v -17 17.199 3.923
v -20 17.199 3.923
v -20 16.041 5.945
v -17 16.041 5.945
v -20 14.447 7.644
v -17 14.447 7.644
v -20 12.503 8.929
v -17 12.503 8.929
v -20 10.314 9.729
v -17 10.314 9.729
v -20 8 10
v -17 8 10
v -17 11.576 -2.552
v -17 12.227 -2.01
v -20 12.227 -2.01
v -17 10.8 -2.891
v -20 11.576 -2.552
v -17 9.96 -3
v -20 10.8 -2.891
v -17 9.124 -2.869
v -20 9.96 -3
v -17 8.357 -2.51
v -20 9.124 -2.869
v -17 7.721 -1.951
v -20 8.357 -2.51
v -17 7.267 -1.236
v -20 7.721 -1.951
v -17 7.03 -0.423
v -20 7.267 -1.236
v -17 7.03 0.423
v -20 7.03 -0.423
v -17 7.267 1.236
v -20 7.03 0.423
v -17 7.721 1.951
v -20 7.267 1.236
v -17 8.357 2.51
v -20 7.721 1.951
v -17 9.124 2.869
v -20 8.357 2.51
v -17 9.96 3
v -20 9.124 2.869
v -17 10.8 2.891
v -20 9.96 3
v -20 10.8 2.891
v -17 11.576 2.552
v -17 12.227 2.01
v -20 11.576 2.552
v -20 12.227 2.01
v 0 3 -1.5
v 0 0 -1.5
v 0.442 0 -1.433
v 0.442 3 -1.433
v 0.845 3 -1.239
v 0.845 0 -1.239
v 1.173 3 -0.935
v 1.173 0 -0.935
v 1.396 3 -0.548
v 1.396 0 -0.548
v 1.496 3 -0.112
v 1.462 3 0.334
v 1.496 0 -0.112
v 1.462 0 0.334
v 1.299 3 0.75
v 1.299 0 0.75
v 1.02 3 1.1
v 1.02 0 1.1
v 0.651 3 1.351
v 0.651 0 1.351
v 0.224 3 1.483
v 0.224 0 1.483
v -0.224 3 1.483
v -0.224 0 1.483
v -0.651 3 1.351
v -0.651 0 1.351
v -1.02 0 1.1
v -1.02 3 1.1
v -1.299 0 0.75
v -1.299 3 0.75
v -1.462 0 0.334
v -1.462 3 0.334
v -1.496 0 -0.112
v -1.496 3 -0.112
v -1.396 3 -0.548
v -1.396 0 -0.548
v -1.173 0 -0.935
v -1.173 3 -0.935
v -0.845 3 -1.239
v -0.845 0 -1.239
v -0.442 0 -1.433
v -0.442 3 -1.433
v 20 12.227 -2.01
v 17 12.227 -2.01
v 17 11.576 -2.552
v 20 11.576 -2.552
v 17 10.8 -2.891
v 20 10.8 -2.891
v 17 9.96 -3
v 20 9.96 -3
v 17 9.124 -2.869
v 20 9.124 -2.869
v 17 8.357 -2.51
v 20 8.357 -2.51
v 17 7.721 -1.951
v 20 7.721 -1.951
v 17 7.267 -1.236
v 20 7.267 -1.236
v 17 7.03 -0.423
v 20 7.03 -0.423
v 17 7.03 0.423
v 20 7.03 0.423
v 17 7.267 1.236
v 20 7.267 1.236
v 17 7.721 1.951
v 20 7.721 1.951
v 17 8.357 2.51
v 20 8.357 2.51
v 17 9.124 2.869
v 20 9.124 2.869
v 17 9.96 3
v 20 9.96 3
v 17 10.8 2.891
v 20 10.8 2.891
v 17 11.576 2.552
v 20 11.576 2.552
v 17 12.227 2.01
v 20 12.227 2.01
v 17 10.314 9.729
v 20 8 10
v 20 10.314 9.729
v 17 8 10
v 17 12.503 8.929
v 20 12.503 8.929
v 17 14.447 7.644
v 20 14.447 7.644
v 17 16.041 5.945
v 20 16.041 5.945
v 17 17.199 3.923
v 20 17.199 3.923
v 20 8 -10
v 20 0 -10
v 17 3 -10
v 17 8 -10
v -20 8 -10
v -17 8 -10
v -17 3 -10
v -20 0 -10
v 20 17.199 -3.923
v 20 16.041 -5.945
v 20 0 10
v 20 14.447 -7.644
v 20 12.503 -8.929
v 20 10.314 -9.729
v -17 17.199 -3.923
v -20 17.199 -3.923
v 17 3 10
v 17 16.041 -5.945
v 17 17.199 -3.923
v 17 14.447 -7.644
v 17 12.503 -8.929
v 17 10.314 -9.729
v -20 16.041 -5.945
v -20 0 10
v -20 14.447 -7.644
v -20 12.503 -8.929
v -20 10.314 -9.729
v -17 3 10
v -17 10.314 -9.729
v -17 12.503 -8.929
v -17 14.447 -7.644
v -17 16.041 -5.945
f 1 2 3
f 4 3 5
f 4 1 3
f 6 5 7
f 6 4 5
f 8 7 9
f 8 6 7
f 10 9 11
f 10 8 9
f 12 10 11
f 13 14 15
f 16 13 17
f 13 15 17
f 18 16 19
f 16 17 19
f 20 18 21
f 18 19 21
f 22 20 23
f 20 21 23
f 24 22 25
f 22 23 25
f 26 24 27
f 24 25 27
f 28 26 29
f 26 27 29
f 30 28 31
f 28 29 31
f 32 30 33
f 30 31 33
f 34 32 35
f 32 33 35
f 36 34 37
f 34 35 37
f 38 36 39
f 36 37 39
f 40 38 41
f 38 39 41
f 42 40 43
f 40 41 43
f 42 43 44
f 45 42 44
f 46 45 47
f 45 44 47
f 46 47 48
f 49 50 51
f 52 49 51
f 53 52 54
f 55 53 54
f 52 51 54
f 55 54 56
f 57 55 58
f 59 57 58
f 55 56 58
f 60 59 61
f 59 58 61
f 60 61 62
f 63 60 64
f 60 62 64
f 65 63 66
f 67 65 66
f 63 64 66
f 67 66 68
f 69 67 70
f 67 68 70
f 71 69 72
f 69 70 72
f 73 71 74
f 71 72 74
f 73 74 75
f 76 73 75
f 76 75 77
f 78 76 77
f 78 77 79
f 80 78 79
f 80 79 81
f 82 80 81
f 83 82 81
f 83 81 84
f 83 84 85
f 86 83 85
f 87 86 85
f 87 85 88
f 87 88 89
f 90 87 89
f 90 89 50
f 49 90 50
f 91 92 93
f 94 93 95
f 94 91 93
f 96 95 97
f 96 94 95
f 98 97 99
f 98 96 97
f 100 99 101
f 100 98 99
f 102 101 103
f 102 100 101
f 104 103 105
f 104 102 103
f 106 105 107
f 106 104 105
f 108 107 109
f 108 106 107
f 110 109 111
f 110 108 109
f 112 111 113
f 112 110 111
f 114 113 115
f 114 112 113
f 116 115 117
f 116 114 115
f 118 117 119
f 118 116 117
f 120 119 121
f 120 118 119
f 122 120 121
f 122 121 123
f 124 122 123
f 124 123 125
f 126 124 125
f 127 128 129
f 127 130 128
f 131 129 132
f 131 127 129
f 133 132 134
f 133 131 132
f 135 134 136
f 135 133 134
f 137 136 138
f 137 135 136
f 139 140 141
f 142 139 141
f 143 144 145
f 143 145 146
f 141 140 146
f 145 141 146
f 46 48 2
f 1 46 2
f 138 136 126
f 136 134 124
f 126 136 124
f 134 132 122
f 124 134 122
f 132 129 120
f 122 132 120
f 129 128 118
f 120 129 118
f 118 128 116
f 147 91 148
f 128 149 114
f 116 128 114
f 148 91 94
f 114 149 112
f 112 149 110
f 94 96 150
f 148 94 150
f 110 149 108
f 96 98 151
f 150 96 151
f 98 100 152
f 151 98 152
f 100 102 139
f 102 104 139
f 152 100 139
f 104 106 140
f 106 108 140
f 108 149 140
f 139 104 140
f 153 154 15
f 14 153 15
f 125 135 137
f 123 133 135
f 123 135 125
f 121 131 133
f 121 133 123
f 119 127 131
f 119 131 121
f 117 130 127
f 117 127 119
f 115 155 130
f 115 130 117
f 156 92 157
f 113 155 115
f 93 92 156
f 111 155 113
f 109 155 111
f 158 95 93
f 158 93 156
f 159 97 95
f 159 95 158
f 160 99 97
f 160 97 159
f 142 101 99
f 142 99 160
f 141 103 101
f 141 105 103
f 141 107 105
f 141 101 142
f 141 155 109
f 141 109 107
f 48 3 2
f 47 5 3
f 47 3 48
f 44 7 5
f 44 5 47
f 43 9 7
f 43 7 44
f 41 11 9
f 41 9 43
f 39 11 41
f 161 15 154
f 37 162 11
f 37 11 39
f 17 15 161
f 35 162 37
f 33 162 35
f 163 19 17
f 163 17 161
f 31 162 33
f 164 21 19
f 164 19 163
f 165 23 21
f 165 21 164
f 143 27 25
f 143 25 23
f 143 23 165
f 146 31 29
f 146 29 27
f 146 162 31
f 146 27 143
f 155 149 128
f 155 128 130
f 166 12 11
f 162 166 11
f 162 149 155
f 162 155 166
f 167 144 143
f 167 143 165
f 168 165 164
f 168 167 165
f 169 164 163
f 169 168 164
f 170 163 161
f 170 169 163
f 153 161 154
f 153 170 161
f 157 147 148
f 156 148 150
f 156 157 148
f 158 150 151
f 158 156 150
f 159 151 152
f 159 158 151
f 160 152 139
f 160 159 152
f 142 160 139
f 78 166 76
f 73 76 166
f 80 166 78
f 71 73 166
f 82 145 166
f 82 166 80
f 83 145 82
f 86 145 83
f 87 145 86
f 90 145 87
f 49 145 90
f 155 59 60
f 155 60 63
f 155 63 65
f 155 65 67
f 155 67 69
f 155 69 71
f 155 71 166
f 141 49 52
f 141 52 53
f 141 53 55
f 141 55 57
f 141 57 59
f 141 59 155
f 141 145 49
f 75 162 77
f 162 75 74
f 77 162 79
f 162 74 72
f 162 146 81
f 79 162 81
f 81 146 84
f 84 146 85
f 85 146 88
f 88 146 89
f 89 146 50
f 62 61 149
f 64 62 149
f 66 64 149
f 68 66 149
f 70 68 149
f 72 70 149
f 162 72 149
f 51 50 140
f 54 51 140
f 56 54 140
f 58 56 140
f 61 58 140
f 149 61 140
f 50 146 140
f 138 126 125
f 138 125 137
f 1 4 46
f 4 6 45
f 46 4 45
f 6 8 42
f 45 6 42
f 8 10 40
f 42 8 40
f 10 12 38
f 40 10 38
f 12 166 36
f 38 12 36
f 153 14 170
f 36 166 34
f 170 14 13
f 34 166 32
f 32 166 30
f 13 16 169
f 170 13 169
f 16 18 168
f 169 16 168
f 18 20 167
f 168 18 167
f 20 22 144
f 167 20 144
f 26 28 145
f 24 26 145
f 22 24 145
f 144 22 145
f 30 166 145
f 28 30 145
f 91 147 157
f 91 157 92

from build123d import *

# Parameters (mm, degrees)
SKETCH1_W                   = 40
SKETCH1_H                   = 20
BOSS_EXTRUDE1_DEPTH         = 3
SKETCH2_W                   = 3
SKETCH2_H                   = 20
BOSS_EXTRUDE2_DEPTH         = 15
CUT_EXTRUDE1_REACH          = 46.989
SKETCH4_R                   = 3
FILLET1_RADIUS              = 10
FILLET1_LENGTH              = 3
CUT_EXTRUDE3_REACH          = 46.989
FILLET1_OF_MIRROR1_2_RADIUS = 10
FILLET1_OF_MIRROR1_2_LENGTH = 3
CUT_EXTRUDE2_REACH          = 30.21
SKETCH6_R                   = 1.5


with BuildPart() as part:
    # Sketch1 → Boss-Extrude1 (new body)
    with BuildSketch(Plane(origin=(0, 0, 0), x_dir=(1, 0, 0), z_dir=(0, 1, 0))):
        Rectangle(SKETCH1_W, SKETCH1_H)
    extrude(amount=BOSS_EXTRUDE1_DEPTH)

    # Sketch2 → Boss-Extrude2 (add)
    with BuildSketch(Plane(origin=(0, 3, 0), x_dir=(1, 0, 0), z_dir=(0, 1, 0))):
        with Locations((-18.5, 0)):
            Rectangle(SKETCH2_W, SKETCH2_H)
    boss_extrude2 = extrude(amount=BOSS_EXTRUDE2_DEPTH)

    # Sketch4 → Cut-Extrude1 (cut, up to next)
    with BuildSketch(Plane.ZY.offset(20), mode=Mode.PRIVATE) as cut_extrude1_sk1:
        with Locations((0, 10)):
            Circle(SKETCH4_R)
    cut_extrude1_tool1 = extrude(cut_extrude1_sk1.sketch, amount=-CUT_EXTRUDE1_REACH, mode=Mode.PRIVATE) & part.part
    cut_extrude1 = cut_extrude1_tool1.solids().sort_by_distance((-20, 10, 0))[0]
    add(cut_extrude1, mode=Mode.SUBTRACT)

    # Fillet1: full round fillet: the end face becomes a half cylinder, R = half its width
    fillet1_face = Plane((-18.5, 18, 0), x_dir=(1, 0, 0), z_dir=(0, 1, 0))  # on the end face: x along it, z out of the body
    fillet1_slab = fillet1_face.offset(-FILLET1_RADIUS / 2) * Box(FILLET1_LENGTH, 2 * FILLET1_RADIUS, FILLET1_RADIUS, mode=Mode.PRIVATE)  # the body's end, R deep
    fillet1_round = Plane((-18.5, 8, 0), x_dir=(0, 1, 0), z_dir=(1, 0, 0)) * Cylinder(FILLET1_RADIUS, FILLET1_LENGTH, mode=Mode.PRIVATE)  # its axis R under the face
    add(fillet1_slab - fillet1_round, mode=Mode.SUBTRACT)

    # Sketch8 → Cut-Extrude3 (cut, up to next)
    with BuildSketch(Plane.ZY.offset(20), mode=Mode.PRIVATE) as cut_extrude3_sk1:
        Polygon((0, 7), (5, 20), (-5, 20), align=None)
    cut_extrude3_tool1 = extrude(cut_extrude3_sk1.sketch, amount=-CUT_EXTRUDE3_REACH, mode=Mode.PRIVATE) & part.part
    cut_extrude3 = cut_extrude3_tool1.solids().sort_by_distance((-20, 15.666667, 0))[0]
    add(cut_extrude3, mode=Mode.SUBTRACT)

    # Mirror1: Boss-Extrude2, Cut-Extrude1, Cut-Extrude3 across plane
    add(boss_extrude2.mirror(Plane(origin=(0, 0, 0), x_dir=(0, 0, 1), z_dir=(1, 0, 0))))
    add(cut_extrude1.mirror(Plane(origin=(0, 0, 0), x_dir=(0, 0, 1), z_dir=(1, 0, 0))), mode=Mode.SUBTRACT)
    add(cut_extrude3.mirror(Plane(origin=(0, 0, 0), x_dir=(0, 0, 1), z_dir=(1, 0, 0))), mode=Mode.SUBTRACT)

    # Fillet1 of Mirror1 2: full round fillet: the end face becomes a half cylinder, R = half its width
    fillet1_of_mirror1_2_face = Plane((18.5, 18, 0), x_dir=(-1, 0, 0), z_dir=(0, 1, 0))  # on the end face: x along it, z out of the body
    fillet1_of_mirror1_2_slab = fillet1_of_mirror1_2_face.offset(-FILLET1_OF_MIRROR1_2_RADIUS / 2) * Box(FILLET1_OF_MIRROR1_2_LENGTH, 2 * FILLET1_OF_MIRROR1_2_RADIUS, FILLET1_OF_MIRROR1_2_RADIUS, mode=Mode.PRIVATE)  # the body's end, R deep
    fillet1_of_mirror1_2_round = Plane((18.5, 8, 0), x_dir=(0, 1, 0), z_dir=(-1, 0, 0)) * Cylinder(FILLET1_OF_MIRROR1_2_RADIUS, FILLET1_OF_MIRROR1_2_LENGTH, mode=Mode.PRIVATE)  # its axis R under the face
    add(fillet1_of_mirror1_2_slab - fillet1_of_mirror1_2_round, mode=Mode.SUBTRACT)

    # Sketch6 → Cut-Extrude2 (cut, up to next)
    with BuildSketch(Plane.XZ, mode=Mode.PRIVATE) as cut_extrude2_sk1:
        with Locations(Location((0, 0, 0), (0, 0, 270))):
            Circle(SKETCH6_R)
    cut_extrude2_tool1 = extrude(cut_extrude2_sk1.sketch, amount=-CUT_EXTRUDE2_REACH, mode=Mode.PRIVATE) & part.part
    add(cut_extrude2_tool1.solids().sort_by_distance((0, 0, 0))[0], mode=Mode.SUBTRACT)


solid = part.part
